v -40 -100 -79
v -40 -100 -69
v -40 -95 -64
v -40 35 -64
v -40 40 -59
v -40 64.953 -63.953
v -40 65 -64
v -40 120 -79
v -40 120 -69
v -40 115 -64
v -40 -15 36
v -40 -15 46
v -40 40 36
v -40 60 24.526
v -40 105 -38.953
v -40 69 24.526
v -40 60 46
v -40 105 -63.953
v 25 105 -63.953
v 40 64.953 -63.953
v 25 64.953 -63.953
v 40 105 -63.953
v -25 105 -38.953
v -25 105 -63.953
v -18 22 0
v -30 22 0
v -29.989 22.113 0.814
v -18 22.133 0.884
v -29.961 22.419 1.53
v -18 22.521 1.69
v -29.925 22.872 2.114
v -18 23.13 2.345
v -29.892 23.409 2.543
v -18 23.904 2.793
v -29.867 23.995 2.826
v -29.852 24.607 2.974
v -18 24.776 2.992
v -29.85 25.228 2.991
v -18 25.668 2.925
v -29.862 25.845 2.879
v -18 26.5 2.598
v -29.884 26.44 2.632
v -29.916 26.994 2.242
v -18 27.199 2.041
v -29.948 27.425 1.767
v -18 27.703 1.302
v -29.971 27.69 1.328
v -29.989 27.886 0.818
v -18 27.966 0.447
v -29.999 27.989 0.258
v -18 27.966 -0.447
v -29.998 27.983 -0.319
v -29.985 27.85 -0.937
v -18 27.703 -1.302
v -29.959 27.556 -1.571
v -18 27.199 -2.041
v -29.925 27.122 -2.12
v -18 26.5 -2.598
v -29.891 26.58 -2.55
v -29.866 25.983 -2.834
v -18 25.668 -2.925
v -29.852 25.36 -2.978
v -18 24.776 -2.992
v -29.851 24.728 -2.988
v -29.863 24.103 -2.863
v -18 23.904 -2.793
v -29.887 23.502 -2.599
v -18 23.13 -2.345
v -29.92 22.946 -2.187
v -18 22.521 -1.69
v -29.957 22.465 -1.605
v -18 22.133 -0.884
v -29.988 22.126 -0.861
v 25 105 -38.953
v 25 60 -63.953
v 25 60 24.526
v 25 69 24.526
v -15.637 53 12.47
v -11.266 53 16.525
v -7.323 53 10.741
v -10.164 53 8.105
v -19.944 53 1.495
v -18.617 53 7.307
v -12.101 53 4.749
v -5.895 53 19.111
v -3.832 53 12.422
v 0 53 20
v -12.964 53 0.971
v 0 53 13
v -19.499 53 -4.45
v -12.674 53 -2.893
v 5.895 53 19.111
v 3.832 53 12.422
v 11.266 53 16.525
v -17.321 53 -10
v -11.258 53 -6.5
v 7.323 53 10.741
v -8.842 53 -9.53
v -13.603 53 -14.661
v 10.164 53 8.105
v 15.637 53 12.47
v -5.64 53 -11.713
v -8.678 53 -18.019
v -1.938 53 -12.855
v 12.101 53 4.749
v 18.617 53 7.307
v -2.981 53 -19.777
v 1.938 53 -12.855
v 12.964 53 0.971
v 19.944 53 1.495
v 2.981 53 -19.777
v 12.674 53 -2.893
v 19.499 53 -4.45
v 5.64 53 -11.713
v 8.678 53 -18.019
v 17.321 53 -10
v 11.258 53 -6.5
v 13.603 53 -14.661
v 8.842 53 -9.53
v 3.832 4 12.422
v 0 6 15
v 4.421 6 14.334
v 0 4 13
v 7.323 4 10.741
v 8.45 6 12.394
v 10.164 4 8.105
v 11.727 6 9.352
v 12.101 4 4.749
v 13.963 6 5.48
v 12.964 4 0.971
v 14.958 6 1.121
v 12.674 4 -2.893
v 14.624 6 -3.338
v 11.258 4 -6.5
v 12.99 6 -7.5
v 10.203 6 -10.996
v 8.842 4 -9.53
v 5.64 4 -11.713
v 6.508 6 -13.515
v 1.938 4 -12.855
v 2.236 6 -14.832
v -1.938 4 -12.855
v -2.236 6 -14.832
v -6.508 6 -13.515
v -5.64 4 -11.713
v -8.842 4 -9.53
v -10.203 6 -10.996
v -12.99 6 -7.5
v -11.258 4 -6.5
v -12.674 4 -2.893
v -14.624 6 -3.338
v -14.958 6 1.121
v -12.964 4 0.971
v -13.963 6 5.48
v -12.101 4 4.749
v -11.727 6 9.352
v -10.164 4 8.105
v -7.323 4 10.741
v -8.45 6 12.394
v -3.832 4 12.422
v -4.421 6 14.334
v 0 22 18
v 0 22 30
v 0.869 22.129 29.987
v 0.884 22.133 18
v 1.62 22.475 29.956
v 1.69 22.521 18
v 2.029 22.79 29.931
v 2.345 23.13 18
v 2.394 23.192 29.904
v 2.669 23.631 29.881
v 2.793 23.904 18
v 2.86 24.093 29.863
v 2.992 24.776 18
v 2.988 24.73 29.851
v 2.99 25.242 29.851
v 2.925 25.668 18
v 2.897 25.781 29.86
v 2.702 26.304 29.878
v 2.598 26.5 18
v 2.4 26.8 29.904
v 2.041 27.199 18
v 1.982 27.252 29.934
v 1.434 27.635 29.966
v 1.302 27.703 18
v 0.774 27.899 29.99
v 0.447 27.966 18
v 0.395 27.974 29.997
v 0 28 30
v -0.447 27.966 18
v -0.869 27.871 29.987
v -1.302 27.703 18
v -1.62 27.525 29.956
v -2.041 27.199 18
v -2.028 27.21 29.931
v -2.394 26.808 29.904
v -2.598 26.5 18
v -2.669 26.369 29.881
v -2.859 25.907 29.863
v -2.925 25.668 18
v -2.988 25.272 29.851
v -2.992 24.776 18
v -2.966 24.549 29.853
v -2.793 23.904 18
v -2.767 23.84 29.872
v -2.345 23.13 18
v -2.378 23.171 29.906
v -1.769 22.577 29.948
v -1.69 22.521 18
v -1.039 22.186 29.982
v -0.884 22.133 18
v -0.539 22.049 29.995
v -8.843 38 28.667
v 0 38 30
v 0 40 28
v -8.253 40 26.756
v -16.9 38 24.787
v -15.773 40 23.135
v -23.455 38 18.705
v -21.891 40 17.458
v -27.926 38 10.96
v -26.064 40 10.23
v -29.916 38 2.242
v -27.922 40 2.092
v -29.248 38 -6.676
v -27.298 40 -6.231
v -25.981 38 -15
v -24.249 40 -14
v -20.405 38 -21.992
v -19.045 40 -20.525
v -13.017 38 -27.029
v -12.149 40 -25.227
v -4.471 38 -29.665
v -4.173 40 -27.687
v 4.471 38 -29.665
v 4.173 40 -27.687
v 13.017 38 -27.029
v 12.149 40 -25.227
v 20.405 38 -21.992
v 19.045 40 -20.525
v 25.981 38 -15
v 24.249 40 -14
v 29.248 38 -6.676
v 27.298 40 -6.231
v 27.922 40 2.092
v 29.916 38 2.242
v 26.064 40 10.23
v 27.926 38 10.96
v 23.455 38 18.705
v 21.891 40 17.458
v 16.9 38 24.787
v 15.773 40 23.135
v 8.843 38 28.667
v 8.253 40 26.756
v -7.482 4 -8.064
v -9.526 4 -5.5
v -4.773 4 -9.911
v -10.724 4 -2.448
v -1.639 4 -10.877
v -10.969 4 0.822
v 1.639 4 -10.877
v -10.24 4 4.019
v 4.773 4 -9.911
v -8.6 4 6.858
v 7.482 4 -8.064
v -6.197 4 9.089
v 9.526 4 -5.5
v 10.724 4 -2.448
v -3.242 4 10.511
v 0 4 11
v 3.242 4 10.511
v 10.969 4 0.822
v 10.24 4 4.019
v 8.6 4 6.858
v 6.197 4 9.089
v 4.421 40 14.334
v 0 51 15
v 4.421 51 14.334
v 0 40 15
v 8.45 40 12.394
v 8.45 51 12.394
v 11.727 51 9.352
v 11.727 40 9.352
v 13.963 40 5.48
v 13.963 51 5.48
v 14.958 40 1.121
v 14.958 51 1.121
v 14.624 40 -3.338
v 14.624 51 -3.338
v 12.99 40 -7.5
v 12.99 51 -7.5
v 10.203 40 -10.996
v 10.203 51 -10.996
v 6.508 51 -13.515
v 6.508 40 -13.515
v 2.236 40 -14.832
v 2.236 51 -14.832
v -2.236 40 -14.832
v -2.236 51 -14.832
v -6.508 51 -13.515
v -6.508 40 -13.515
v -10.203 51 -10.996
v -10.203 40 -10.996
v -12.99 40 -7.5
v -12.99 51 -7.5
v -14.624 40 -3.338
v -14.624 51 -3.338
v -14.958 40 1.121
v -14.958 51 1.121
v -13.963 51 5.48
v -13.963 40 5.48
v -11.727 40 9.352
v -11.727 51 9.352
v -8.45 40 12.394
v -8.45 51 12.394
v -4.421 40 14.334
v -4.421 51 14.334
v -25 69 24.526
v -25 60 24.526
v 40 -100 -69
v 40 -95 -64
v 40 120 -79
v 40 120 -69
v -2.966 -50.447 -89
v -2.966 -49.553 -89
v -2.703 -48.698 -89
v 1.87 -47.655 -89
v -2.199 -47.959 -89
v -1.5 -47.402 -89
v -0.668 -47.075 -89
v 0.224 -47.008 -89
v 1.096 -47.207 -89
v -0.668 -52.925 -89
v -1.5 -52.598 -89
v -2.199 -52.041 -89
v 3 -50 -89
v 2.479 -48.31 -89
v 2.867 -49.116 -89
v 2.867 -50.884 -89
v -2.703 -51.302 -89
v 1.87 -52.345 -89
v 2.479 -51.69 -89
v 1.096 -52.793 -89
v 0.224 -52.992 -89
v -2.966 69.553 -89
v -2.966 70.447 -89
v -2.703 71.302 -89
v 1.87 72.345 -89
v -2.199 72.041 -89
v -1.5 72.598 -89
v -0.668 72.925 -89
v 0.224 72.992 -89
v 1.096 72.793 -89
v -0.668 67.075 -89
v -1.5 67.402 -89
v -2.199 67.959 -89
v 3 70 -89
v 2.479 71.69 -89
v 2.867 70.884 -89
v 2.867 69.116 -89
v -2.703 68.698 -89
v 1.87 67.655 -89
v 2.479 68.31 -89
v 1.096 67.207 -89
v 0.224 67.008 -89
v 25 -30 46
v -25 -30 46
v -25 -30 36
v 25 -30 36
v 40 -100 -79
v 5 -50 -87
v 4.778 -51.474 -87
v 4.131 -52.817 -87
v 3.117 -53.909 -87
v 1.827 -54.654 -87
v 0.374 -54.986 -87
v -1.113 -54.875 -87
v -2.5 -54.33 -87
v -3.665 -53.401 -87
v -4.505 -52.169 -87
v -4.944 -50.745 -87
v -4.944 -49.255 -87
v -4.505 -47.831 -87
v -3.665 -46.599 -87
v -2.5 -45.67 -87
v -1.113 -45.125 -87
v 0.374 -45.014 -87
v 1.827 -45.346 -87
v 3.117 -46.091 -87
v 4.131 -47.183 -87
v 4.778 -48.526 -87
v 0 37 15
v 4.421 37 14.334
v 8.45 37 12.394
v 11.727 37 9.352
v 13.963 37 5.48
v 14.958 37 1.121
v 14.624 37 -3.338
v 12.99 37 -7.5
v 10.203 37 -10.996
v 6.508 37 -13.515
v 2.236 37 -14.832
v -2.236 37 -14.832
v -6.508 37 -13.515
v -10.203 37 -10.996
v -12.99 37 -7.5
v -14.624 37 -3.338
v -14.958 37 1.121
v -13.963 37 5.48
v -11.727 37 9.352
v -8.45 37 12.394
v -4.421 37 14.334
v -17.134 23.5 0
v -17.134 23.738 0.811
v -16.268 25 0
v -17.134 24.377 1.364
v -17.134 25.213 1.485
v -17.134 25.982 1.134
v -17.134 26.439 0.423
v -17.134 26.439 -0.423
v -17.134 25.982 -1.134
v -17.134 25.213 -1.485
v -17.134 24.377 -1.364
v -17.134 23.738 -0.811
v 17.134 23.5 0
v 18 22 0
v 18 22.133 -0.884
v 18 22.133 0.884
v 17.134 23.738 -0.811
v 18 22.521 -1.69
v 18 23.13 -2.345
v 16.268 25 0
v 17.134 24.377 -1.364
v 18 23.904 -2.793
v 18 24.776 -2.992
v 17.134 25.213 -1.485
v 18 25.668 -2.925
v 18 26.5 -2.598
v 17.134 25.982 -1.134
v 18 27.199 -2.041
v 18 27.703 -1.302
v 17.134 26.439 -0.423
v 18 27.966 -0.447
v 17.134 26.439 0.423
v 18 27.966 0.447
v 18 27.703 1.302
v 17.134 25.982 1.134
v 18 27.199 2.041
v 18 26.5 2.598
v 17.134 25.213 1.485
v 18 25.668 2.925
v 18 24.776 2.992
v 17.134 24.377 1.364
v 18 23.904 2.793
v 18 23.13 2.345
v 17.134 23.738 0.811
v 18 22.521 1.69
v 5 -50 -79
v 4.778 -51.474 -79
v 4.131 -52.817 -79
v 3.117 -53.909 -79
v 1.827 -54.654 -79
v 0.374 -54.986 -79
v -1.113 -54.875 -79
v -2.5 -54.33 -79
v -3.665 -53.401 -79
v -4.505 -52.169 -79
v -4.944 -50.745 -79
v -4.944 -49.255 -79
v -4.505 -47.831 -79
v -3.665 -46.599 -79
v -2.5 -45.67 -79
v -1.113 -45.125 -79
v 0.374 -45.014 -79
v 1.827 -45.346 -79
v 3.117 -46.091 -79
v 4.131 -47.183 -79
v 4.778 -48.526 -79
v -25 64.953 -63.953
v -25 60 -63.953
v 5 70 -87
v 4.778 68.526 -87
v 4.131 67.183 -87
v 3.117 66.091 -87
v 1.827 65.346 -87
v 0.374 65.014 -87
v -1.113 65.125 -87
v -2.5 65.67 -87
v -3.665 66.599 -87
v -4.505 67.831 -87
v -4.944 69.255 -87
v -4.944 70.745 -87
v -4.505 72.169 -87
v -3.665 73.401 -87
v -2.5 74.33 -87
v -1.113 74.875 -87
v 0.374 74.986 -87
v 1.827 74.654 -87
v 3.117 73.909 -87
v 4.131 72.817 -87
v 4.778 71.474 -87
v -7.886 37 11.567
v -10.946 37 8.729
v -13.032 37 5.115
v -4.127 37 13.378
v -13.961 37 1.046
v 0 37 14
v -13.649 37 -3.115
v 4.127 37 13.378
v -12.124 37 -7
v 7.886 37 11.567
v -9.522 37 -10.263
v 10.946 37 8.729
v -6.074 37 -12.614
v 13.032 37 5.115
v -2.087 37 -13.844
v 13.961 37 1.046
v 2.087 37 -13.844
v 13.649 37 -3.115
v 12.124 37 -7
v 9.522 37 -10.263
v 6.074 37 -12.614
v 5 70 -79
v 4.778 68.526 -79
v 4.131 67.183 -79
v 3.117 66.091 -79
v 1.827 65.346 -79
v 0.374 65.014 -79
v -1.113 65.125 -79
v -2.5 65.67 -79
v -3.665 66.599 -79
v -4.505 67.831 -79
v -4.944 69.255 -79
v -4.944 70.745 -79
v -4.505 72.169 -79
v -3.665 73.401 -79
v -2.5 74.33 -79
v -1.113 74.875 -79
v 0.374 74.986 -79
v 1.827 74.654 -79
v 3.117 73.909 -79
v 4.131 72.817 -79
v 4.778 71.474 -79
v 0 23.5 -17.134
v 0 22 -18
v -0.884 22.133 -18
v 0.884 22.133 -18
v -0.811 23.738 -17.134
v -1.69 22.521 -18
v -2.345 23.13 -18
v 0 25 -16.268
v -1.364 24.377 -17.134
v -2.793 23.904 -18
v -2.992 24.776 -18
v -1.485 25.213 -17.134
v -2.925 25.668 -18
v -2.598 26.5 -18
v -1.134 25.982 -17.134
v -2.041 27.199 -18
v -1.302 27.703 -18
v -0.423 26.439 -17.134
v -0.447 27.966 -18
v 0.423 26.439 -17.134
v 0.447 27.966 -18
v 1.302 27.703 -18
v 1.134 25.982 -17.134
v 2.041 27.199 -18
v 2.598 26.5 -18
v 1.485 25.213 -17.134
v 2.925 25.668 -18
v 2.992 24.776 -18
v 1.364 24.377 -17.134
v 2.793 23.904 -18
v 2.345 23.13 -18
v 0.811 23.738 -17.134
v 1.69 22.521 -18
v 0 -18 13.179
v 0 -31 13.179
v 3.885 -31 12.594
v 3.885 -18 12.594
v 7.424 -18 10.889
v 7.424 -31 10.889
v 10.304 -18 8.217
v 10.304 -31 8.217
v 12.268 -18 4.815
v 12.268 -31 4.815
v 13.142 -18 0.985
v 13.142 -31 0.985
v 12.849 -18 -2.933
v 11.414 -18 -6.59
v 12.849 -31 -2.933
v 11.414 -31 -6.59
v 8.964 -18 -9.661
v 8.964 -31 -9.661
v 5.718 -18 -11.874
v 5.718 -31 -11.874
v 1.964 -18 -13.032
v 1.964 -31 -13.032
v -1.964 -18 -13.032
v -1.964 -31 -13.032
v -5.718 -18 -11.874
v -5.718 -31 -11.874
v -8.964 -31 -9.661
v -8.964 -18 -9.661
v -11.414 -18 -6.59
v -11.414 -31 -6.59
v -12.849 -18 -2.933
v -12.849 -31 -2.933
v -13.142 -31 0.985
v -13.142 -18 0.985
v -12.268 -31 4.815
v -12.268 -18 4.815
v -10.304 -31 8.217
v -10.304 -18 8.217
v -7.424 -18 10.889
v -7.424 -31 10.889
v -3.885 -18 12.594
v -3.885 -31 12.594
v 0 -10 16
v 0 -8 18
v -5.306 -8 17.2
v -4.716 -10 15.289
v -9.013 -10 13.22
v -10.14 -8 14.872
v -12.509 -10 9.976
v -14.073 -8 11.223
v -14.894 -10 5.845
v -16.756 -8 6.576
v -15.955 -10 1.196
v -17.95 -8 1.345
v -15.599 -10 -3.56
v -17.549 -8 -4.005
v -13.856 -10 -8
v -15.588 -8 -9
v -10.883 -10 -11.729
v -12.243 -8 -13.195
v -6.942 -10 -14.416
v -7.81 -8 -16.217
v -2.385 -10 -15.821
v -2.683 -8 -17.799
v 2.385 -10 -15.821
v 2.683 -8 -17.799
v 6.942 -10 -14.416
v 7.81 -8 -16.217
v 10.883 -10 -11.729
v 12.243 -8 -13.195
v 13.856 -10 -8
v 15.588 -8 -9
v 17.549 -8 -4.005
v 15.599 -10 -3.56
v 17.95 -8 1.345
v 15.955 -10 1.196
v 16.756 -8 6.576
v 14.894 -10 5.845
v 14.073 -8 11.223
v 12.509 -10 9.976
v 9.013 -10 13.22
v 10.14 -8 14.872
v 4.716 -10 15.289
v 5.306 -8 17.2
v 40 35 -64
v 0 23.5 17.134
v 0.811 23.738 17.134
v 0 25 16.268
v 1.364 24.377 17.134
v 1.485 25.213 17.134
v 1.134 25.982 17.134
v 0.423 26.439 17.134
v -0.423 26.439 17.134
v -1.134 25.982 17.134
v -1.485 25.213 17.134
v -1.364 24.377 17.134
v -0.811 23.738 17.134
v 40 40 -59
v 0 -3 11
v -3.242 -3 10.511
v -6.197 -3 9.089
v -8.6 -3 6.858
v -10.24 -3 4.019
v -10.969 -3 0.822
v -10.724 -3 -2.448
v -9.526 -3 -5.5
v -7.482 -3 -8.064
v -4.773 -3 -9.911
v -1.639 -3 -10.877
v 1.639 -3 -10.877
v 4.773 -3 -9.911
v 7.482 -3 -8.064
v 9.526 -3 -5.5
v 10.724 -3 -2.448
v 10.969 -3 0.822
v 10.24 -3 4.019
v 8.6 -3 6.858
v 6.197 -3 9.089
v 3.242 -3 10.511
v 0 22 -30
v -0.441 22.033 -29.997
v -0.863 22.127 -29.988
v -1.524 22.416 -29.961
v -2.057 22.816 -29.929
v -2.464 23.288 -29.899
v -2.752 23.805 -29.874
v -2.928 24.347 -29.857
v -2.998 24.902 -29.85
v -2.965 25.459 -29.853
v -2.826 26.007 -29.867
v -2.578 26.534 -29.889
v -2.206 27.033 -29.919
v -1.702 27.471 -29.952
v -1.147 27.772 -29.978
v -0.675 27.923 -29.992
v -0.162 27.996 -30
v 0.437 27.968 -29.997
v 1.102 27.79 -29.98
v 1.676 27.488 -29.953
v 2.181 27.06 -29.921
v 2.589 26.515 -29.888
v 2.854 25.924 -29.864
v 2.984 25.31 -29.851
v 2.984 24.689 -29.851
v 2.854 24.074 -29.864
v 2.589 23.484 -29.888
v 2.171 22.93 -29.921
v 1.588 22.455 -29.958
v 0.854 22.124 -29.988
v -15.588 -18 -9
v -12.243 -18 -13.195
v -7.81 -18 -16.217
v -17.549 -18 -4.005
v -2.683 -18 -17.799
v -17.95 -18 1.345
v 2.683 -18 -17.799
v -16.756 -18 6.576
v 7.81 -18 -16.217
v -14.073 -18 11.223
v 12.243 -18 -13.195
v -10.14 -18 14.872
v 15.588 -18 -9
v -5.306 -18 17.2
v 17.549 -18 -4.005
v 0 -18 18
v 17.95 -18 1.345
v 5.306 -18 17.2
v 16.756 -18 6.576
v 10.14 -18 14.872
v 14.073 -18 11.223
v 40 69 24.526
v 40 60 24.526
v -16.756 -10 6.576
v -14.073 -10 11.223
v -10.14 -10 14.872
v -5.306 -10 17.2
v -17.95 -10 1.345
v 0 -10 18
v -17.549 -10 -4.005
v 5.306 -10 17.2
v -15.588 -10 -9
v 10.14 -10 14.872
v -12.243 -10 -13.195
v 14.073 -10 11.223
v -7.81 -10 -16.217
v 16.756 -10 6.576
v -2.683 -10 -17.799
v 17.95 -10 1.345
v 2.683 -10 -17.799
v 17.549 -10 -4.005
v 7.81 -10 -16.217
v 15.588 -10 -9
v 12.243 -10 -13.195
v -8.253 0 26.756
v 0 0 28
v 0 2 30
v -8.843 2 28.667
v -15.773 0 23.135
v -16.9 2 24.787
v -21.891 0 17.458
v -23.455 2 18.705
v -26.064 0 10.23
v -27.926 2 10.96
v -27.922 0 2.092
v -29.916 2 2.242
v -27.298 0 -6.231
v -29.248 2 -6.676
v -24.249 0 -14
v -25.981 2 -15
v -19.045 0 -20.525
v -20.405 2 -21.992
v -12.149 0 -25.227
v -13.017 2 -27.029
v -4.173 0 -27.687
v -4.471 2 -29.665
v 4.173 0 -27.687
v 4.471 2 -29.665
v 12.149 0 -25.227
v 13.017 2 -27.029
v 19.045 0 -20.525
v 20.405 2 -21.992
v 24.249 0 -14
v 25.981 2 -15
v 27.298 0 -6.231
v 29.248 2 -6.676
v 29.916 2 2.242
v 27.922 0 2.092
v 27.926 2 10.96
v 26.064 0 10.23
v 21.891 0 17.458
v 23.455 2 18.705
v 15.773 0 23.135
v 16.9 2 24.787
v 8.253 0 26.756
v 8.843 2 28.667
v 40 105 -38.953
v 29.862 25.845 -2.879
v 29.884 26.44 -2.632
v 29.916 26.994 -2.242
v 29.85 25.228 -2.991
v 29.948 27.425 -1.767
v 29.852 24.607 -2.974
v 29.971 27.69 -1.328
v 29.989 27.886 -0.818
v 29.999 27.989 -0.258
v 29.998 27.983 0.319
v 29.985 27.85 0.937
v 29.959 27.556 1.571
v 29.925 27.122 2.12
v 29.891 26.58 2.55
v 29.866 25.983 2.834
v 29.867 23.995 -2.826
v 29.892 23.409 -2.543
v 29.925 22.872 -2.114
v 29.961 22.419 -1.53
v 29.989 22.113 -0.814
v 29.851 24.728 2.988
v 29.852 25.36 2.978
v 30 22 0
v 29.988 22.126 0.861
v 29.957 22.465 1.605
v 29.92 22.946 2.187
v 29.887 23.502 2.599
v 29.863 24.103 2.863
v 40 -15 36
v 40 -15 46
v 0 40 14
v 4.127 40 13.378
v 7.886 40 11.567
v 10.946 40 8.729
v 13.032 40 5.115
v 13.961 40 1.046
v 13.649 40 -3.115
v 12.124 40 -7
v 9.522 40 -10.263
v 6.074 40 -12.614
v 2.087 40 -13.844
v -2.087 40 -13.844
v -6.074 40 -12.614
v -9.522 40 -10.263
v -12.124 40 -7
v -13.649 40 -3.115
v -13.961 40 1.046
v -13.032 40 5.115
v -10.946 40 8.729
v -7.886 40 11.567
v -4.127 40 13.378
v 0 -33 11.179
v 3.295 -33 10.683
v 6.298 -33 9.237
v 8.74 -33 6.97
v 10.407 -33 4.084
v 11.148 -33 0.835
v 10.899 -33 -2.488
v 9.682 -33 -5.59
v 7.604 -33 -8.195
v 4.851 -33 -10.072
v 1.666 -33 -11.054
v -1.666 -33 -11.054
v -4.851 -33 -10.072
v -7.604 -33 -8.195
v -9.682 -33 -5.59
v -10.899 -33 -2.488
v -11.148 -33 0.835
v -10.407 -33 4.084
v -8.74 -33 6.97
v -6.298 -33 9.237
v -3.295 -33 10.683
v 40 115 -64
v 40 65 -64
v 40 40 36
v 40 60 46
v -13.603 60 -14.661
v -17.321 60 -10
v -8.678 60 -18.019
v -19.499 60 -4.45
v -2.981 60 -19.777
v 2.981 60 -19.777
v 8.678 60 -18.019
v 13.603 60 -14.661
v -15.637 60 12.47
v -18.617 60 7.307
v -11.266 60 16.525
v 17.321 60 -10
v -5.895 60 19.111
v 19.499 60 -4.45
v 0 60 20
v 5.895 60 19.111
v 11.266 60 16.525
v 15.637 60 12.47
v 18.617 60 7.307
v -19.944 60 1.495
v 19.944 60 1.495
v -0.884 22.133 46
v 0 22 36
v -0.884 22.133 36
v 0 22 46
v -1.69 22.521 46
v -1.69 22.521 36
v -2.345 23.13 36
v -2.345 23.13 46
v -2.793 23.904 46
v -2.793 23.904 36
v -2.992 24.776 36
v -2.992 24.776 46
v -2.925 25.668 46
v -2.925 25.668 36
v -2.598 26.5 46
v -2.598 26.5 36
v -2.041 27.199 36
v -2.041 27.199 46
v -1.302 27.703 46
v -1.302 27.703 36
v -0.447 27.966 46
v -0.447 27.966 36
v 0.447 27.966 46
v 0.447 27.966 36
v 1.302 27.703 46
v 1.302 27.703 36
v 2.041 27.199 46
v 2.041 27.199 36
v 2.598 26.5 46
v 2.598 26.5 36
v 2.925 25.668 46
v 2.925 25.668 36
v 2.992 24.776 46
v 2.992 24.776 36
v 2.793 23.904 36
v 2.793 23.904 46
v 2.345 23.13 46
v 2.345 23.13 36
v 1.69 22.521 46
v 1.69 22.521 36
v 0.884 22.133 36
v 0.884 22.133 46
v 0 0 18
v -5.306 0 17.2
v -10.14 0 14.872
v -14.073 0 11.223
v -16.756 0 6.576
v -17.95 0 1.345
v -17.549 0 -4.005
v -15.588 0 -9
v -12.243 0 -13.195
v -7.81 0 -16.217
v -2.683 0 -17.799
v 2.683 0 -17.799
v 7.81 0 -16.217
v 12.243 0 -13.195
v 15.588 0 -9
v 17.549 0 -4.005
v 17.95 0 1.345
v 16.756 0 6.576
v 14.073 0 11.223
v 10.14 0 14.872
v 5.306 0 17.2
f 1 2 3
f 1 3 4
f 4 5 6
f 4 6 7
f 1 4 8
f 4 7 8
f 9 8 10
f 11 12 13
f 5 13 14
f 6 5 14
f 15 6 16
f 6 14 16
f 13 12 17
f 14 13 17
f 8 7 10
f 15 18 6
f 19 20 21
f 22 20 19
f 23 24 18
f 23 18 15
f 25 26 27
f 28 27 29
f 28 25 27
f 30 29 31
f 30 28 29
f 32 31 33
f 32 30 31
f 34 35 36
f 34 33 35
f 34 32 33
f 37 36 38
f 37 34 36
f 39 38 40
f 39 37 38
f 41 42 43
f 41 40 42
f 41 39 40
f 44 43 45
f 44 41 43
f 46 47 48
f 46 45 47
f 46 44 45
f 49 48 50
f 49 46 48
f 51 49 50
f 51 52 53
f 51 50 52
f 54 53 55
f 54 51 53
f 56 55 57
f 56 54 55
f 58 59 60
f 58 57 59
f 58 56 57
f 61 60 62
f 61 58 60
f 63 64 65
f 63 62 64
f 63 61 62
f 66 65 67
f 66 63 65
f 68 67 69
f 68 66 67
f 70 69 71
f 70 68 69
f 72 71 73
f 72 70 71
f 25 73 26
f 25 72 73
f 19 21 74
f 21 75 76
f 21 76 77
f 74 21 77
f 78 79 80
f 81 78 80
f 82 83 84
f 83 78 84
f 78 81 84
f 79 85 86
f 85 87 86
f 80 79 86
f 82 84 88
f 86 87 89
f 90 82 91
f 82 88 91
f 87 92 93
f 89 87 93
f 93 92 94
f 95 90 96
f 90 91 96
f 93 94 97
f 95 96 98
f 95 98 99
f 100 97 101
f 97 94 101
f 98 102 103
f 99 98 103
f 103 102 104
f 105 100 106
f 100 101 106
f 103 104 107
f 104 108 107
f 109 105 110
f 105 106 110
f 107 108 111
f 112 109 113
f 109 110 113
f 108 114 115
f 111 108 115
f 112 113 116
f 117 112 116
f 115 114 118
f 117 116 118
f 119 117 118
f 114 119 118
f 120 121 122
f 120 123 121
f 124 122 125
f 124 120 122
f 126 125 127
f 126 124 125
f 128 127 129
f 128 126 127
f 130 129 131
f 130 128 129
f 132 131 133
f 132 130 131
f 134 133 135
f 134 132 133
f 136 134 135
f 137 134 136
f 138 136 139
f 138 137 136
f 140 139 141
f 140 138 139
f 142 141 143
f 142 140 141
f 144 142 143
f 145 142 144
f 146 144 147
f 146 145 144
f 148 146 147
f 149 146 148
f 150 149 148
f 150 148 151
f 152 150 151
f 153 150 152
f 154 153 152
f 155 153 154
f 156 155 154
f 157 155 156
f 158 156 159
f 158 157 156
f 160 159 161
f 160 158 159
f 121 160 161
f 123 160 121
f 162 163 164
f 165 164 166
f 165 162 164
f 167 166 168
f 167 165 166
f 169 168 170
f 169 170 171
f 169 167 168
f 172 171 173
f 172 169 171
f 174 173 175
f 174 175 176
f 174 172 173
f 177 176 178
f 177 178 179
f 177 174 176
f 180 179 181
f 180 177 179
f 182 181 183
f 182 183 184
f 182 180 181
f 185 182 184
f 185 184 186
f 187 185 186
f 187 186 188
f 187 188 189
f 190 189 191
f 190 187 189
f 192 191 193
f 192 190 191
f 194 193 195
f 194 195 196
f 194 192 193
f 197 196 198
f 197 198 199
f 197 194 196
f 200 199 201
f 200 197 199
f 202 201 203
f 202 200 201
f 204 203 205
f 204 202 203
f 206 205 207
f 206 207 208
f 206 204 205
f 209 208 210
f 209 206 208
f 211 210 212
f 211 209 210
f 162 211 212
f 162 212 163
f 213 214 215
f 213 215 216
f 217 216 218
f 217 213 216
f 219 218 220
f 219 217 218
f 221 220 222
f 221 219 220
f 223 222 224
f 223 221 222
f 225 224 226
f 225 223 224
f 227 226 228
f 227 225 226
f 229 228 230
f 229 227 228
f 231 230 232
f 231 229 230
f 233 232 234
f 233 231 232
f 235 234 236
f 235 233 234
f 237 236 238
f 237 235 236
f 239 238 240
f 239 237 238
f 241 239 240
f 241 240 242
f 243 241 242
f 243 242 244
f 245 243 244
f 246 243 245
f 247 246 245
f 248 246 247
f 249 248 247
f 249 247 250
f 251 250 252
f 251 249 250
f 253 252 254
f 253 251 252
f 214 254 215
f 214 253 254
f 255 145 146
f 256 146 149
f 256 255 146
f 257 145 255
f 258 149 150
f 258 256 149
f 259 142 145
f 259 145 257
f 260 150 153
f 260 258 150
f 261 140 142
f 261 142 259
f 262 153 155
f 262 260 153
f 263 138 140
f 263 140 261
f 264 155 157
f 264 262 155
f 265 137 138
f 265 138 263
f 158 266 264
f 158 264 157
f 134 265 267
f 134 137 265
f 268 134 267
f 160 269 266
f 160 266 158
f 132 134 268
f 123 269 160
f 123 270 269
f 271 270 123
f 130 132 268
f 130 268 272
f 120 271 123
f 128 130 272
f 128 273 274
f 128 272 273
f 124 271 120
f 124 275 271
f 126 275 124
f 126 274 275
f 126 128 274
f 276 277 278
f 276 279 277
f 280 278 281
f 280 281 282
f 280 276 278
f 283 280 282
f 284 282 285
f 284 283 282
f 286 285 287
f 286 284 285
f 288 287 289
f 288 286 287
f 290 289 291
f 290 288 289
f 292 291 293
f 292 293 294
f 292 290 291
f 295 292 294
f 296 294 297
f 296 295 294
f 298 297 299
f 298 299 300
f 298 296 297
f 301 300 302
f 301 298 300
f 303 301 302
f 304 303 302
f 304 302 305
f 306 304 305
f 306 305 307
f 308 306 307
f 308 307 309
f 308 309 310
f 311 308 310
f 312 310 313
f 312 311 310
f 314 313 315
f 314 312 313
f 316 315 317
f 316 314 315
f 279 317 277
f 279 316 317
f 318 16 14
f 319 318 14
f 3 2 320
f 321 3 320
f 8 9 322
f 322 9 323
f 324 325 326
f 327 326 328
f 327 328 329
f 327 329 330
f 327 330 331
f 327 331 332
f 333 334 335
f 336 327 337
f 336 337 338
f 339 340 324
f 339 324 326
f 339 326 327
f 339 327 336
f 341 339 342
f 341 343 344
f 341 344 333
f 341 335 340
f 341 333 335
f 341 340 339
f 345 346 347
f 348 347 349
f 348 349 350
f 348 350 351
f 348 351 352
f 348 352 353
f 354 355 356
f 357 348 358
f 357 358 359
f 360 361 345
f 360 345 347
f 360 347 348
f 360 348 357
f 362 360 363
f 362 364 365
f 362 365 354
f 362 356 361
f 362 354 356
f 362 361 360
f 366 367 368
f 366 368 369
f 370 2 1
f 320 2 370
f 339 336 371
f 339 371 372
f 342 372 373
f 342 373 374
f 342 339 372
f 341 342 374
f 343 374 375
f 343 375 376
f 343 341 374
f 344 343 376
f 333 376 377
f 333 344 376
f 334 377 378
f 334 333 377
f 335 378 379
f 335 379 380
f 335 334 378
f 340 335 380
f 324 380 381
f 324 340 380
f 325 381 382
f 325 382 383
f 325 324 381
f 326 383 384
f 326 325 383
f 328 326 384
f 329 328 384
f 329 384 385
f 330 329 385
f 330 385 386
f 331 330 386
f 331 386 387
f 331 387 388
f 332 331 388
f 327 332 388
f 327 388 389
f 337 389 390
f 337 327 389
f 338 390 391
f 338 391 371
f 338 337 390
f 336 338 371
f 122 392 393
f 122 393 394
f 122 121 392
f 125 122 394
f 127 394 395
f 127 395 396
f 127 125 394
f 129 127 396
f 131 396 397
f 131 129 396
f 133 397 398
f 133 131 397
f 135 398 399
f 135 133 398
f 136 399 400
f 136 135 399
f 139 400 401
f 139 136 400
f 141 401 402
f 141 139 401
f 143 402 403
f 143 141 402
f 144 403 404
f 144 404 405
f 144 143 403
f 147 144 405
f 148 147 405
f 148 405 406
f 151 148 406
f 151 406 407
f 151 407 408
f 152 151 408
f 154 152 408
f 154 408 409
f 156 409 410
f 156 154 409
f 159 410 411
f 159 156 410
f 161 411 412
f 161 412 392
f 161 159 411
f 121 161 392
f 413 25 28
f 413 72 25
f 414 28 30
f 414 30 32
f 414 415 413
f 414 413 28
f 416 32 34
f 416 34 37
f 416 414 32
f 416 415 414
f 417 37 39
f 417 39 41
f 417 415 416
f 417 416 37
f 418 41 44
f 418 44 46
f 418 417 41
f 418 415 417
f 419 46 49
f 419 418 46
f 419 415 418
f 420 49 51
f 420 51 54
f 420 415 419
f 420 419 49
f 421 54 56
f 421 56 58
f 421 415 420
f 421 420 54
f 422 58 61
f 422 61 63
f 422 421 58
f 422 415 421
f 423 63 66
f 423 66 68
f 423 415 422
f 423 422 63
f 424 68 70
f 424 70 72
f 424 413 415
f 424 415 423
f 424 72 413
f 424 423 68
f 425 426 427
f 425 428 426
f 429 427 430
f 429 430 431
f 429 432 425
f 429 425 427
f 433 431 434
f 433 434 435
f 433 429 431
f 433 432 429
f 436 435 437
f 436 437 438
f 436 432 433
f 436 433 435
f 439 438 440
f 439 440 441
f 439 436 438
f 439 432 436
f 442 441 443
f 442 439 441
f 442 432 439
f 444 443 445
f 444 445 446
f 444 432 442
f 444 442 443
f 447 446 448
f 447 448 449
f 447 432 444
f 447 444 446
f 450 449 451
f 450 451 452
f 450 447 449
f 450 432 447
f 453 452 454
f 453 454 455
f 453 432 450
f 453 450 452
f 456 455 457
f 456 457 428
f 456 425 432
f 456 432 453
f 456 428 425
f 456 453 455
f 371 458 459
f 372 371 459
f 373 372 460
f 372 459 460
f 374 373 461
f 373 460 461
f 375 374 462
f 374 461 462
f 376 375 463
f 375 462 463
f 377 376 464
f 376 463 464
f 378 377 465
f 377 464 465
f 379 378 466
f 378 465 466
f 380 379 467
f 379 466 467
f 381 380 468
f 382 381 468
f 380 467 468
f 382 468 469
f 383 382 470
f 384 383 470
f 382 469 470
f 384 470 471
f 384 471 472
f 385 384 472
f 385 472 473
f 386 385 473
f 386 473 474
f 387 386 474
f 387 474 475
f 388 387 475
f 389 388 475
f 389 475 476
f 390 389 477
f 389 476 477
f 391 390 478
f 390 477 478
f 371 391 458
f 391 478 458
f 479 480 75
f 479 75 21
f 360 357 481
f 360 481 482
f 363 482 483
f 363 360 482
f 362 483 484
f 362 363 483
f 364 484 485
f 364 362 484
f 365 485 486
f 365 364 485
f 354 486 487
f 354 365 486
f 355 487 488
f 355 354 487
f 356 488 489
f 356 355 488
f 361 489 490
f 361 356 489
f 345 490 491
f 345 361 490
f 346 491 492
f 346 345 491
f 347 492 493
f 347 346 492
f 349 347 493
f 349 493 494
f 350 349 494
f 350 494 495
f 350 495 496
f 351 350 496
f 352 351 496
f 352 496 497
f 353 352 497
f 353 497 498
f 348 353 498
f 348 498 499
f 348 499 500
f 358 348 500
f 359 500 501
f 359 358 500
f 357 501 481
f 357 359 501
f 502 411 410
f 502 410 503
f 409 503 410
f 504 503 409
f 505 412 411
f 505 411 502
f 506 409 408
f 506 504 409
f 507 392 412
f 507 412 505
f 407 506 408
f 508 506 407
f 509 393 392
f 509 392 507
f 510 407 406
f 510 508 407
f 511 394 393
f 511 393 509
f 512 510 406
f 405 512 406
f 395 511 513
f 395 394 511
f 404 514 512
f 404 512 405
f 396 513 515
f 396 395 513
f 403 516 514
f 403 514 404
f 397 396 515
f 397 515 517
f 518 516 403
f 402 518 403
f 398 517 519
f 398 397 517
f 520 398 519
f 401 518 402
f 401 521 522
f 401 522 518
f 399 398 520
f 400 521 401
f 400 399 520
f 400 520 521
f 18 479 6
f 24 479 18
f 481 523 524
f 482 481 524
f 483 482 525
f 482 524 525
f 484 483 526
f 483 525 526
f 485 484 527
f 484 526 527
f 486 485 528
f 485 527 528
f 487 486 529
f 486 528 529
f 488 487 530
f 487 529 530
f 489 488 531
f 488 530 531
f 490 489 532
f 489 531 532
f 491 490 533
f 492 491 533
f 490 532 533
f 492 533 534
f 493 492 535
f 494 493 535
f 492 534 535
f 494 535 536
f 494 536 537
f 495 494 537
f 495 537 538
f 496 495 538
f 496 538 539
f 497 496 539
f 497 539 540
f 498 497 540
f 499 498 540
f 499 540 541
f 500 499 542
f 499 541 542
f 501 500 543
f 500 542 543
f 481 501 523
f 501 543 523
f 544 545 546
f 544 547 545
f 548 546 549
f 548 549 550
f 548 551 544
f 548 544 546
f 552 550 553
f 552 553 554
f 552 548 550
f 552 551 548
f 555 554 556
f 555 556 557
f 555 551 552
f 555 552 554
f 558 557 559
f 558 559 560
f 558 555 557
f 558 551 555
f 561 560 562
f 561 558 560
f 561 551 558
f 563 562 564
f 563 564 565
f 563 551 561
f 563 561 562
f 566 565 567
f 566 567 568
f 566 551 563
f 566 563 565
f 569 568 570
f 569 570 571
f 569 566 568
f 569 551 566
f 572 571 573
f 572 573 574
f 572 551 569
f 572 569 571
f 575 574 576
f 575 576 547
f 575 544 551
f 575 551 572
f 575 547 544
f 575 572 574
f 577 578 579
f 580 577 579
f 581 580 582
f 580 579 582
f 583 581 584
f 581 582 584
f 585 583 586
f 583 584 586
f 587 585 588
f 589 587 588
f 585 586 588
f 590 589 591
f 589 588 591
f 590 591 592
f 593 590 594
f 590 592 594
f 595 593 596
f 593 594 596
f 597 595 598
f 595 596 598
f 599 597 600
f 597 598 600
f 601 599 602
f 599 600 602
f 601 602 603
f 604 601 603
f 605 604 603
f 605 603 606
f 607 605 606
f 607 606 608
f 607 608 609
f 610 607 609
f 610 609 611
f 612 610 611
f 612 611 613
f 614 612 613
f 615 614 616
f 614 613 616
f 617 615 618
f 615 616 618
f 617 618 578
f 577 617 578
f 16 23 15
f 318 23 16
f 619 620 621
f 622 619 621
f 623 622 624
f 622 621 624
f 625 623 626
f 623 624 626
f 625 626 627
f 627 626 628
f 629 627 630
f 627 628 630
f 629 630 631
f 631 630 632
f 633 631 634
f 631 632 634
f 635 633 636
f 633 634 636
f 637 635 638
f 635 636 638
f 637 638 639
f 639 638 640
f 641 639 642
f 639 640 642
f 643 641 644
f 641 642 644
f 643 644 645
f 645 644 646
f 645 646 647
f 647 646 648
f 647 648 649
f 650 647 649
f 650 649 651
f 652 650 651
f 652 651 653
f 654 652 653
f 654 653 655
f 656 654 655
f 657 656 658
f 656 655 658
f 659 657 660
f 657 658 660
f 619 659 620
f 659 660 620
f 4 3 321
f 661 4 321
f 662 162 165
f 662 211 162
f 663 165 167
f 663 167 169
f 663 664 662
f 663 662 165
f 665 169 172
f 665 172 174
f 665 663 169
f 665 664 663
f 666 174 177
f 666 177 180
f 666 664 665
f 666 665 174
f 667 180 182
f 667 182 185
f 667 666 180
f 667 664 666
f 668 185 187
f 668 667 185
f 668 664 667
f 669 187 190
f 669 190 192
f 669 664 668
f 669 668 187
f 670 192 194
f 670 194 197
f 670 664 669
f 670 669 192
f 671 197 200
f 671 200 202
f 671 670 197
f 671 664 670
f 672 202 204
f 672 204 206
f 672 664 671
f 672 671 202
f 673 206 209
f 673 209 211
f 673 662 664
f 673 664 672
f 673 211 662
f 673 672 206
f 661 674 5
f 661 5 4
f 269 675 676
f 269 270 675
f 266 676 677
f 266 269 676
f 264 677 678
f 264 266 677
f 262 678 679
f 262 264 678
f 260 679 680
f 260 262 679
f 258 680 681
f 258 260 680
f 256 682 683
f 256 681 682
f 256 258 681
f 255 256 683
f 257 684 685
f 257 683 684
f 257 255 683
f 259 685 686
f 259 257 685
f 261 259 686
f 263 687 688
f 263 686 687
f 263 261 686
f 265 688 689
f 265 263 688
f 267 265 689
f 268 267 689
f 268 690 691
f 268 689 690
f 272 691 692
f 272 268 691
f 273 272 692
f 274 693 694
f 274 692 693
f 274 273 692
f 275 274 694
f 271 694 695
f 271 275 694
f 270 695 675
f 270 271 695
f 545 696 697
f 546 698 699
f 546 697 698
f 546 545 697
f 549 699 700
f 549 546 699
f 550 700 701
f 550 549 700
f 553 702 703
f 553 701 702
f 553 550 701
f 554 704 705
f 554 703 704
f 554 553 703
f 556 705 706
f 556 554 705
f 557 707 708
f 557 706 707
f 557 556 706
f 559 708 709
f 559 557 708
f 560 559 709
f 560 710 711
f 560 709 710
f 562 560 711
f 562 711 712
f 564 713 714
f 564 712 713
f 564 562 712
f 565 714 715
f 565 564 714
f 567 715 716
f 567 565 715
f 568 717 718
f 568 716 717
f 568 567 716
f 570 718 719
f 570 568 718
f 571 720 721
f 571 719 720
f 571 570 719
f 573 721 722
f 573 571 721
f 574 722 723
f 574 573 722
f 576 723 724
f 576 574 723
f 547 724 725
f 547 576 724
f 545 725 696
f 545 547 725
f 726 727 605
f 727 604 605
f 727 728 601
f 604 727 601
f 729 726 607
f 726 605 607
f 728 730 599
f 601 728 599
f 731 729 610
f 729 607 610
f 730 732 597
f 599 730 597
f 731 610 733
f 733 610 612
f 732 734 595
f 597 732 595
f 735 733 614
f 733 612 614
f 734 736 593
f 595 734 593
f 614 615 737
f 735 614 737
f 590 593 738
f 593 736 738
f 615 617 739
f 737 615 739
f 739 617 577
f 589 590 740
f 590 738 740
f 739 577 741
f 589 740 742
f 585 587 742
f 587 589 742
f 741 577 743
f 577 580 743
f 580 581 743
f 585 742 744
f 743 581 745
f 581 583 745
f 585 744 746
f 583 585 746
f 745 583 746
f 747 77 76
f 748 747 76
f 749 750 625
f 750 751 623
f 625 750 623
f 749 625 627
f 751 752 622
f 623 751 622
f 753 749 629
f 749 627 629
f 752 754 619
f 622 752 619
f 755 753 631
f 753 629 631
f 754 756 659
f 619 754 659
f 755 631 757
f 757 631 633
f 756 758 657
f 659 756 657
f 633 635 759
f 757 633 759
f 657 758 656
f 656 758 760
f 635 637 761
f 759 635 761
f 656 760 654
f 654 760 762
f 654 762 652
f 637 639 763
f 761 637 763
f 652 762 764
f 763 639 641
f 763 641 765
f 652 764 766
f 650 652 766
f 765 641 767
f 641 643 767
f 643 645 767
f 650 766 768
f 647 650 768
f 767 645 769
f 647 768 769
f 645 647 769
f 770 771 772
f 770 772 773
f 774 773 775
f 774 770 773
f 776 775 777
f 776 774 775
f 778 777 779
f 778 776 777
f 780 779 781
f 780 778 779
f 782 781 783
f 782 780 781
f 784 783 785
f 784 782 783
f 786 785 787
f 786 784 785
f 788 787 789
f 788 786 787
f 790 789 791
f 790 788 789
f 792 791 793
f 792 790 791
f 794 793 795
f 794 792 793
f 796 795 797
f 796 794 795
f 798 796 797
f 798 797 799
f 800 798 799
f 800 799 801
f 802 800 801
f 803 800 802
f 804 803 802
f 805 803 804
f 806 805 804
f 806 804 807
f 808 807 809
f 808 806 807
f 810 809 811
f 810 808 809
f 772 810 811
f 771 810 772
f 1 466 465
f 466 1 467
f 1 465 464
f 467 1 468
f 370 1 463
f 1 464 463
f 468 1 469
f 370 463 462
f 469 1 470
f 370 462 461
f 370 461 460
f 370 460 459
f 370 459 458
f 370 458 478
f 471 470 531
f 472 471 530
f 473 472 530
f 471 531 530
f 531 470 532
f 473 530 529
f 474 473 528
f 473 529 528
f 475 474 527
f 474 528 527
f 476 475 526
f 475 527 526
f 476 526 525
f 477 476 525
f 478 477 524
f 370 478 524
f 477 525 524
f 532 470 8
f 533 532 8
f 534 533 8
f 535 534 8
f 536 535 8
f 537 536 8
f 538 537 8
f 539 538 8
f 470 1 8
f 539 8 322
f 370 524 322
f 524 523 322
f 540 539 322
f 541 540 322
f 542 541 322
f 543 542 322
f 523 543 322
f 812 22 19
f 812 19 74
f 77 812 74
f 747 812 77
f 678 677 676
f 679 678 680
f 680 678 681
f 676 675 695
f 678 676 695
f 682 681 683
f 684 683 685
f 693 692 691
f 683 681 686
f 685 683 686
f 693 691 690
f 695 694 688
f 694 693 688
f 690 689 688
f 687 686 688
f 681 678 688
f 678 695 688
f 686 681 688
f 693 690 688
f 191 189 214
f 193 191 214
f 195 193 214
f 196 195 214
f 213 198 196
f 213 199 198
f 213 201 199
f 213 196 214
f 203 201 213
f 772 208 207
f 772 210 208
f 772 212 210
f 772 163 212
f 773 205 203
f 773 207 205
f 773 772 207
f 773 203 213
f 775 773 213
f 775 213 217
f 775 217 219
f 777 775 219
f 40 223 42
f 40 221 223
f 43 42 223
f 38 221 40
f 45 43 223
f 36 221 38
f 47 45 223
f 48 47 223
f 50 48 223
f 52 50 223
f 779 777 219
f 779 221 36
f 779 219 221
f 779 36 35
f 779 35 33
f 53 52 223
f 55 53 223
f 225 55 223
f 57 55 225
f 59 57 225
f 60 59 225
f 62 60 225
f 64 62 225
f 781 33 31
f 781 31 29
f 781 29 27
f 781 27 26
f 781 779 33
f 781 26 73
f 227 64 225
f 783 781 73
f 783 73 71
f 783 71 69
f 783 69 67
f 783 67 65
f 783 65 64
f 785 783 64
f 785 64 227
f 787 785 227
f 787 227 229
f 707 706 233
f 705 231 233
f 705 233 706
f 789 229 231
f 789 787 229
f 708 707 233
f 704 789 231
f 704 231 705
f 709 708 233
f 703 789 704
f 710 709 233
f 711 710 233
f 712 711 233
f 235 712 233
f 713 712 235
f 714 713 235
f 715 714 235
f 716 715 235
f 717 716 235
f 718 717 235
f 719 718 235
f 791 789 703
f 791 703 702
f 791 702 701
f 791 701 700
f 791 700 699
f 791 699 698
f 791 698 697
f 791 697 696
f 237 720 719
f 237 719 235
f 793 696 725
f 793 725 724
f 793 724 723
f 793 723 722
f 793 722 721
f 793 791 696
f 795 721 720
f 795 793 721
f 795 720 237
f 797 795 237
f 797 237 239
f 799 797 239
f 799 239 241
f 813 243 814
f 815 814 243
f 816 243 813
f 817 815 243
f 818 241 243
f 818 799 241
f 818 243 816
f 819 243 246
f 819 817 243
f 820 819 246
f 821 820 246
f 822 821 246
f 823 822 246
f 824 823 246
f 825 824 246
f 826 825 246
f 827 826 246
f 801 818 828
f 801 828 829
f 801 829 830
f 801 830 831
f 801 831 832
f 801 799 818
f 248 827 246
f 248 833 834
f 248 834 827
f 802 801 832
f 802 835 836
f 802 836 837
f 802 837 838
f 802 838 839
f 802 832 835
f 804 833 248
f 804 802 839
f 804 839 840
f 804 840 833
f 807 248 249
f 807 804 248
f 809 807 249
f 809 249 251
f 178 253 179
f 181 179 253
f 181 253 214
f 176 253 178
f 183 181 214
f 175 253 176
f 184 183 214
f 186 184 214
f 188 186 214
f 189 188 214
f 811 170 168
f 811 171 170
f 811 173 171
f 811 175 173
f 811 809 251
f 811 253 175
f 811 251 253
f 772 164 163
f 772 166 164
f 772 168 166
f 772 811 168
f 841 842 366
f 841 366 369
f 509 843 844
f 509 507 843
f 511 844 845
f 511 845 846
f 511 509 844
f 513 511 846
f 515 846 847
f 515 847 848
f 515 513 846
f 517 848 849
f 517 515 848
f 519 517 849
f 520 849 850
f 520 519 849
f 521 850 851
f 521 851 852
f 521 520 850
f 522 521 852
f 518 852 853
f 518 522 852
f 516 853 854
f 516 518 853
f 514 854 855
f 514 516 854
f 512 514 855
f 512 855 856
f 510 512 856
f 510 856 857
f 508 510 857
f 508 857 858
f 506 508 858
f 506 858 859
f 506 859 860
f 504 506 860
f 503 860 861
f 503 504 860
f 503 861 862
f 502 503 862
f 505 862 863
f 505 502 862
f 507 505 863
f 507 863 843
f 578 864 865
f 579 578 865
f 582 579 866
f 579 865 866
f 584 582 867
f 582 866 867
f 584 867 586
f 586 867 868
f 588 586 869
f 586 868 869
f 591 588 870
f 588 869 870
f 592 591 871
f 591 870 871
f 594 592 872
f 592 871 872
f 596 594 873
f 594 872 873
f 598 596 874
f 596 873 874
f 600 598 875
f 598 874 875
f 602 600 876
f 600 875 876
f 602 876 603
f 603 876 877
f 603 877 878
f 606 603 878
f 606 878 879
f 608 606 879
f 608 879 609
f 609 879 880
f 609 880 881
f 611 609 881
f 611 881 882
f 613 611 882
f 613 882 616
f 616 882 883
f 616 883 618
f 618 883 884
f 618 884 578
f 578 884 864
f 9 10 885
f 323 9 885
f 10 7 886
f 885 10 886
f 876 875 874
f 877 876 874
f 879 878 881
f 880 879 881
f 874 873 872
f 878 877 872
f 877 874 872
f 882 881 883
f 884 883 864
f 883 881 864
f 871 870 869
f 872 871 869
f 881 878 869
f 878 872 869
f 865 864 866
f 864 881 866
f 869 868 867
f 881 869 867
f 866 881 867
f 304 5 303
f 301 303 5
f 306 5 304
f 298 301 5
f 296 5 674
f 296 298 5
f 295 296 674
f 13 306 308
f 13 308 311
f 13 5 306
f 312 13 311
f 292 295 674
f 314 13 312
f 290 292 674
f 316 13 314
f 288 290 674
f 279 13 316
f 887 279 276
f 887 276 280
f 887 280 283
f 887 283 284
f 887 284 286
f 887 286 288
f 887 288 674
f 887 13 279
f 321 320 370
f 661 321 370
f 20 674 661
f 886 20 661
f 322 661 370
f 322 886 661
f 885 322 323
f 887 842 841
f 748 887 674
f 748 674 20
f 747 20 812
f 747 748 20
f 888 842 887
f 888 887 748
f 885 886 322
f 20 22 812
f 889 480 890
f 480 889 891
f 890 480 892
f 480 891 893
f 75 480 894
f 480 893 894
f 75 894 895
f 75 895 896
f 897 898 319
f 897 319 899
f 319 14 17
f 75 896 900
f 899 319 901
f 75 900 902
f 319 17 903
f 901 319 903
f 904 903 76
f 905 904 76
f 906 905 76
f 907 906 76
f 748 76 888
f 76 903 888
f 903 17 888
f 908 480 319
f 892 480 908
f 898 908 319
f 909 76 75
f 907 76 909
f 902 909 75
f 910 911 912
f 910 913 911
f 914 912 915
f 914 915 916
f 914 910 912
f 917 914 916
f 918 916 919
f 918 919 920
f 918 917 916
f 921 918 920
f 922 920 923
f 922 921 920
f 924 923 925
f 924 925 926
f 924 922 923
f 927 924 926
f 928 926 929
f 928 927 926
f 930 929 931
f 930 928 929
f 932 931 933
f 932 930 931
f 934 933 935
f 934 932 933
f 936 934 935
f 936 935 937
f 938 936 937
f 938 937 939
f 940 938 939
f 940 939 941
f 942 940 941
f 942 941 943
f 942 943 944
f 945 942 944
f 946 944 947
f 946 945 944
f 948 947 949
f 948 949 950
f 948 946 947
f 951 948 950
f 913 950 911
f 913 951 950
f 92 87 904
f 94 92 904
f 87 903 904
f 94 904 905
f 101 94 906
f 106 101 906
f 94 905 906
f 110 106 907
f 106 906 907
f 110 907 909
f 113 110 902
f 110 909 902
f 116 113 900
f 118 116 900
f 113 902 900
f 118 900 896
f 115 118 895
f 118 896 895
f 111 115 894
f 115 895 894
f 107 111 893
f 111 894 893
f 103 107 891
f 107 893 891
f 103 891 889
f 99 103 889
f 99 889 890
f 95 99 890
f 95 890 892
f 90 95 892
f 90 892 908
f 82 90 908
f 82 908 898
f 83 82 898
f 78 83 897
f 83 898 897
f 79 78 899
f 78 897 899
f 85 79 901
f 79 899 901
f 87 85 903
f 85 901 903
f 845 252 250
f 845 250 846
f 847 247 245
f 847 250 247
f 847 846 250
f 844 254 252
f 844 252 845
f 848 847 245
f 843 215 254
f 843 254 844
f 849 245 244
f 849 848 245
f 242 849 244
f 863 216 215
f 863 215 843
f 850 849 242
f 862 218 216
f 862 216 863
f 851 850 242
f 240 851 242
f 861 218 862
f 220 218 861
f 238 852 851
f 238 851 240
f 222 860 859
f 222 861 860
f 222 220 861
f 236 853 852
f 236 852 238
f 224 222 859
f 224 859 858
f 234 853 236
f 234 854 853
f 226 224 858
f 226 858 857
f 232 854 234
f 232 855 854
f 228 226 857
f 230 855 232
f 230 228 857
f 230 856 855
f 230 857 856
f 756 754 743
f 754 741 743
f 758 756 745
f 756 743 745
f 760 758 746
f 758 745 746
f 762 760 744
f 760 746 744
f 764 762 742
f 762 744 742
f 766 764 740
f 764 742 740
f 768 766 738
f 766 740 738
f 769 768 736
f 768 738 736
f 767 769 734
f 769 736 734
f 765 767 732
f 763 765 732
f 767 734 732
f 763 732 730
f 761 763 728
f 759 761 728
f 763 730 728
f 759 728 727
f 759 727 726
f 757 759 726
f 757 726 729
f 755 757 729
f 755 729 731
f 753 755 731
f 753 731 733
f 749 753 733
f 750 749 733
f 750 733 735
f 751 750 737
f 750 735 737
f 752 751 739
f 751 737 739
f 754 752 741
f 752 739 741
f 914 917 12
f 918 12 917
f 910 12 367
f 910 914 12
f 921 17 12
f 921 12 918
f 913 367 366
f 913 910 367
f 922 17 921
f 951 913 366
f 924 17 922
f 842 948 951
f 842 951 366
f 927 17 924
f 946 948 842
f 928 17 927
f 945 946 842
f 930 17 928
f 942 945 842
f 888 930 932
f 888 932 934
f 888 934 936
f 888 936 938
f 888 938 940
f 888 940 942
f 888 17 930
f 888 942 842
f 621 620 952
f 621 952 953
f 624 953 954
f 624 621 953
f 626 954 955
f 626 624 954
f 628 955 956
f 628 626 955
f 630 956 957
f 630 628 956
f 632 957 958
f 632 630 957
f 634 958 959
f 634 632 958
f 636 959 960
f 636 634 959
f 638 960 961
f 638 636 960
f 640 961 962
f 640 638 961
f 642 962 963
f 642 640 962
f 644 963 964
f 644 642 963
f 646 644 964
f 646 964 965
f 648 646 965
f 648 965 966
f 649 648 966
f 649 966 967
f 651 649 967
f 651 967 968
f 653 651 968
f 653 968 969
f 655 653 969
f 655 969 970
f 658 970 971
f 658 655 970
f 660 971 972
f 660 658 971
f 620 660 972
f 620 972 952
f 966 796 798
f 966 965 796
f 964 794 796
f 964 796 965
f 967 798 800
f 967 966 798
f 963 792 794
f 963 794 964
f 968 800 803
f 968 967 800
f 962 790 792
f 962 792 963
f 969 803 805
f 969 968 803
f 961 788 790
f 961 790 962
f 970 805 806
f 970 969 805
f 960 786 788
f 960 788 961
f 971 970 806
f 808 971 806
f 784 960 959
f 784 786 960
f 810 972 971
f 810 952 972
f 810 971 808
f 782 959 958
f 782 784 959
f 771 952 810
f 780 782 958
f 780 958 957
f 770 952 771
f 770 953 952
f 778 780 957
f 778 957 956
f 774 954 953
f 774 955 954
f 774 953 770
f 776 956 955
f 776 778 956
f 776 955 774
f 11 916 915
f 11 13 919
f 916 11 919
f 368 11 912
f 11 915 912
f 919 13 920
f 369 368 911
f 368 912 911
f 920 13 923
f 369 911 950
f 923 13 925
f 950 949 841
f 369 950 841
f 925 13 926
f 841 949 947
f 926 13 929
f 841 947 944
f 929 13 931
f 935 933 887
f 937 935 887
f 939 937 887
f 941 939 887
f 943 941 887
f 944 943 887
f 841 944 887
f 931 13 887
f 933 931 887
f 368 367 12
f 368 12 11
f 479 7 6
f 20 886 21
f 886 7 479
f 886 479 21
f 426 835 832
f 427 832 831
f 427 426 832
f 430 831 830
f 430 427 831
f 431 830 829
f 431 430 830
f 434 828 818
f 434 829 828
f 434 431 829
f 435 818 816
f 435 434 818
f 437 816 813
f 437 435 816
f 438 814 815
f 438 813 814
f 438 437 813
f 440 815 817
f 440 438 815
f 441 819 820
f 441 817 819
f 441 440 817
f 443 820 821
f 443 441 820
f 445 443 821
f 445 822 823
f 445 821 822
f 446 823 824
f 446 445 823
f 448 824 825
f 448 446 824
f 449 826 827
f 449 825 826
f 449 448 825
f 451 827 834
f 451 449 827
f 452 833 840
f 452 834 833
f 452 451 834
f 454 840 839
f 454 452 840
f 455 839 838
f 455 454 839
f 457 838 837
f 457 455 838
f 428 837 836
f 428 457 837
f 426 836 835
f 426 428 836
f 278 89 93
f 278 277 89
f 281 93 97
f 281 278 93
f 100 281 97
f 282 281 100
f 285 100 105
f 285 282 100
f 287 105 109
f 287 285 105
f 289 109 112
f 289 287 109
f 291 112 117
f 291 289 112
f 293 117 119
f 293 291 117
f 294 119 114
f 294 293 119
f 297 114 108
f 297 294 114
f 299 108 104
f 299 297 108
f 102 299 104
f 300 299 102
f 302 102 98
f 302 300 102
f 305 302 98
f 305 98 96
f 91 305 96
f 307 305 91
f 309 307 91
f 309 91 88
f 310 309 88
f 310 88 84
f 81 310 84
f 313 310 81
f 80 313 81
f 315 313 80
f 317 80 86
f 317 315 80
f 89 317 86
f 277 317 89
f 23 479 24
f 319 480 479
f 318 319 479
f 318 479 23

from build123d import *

# Parameters (mm, degrees)
F2_SIZE         = 2
F4_COPIES_COUNT = 4
F6_W            = 2
F6_H            = 10
F8_W            = 80
F8_H            = 90
F8_R            = 5
F9_DEPTH        = 10
F10_SIZE        = 15
F12_W           = 80
F12_H           = 100
F13_DEPTH       = 20
F15_DEPTH       = 80
F17_W           = 80
F17_H           = 15
F18_DEPTH       = 120
F18_DEPTH_BACK  = 100
F19_SIZE        = 5
F20_R           = 5
F21_DEPTH       = 10
F22_SIZE        = 2
F23_DEPTH       = 40
F23_DEPTH_BACK  = 40
F24_DEPTH       = 25
F24_DEPTH_BACK  = 25
F25_W           = 7
F25_H           = 20
F31_SIZE        = 2


# Not quite as in the source:
# - a pattern or mirror of a feature is missing from the dataset's text; its kind, count and spacing are read off the source's solid


with BuildPart() as f1:
    # F0 (on Right) → F1 (revolve)
    with BuildSketch(Plane.YZ):
        Polygon((-10, 18), (-10, 11), (40, 11), (40, 30), (0, 30), (0, 18), align=None)
    revolve(axis=Axis((0, 15, 0), (0, -1, 0)))

    # F2
    f2_edges = [f1.edges().sort_by_distance(p)[0] for p in [
        (0, -10, -18),
        (0, 0, -30),
        (0, 40, -30),
    ]]
    chamfer(f2_edges, length=F2_SIZE)

    # F3 (on Right) → F4 (revolve, cut)
    with BuildSketch(Plane.YZ):
        Polygon((22, 18), (25, 16.2679491924), (25, 30), (22, 30), align=None)
    f4 = revolve(axis=Axis((0, 25, 23.1339745962), (0, 0, 1)), mode=Mode.SUBTRACT)

    # F4_copies: F4 ×4 about axis
    f4_copies_axis = Axis((0, 0, 0), (0, 1, 0))
    for i in range(1, F4_COPIES_COUNT):
        add(f4.rotate(f4_copies_axis, i * 360 / F4_COPIES_COUNT), mode=Mode.SUBTRACT)


with BuildPart() as f7:
    # F6 (on Right) → F7 (revolve)
    with BuildSketch(Plane.YZ):
        with Locations((21, 41)):
            Rectangle(F6_W, F6_H)
    revolve(axis=Axis((0, 25, 40.9752885997), (0, 0, -1)))

    # F8 (on offset) → F9 (join)
    with BuildSketch(Plane.XY.offset(46)):
        with Locations((0, 15)):
            Rectangle(F8_W, F8_H)
        with Locations((0, 25)):
            Circle(F8_R, mode=Mode.SUBTRACT)
    extrude(amount=-F9_DEPTH)

    # F10
    f10_edges = [f7.edges().sort_by_distance(p)[0] for p in [
        (-40, -30, 41),
        (40, -30, 41),
    ]]
    chamfer(f10_edges, length=F10_SIZE)

    # F12 (on offset) → F13 (join)
    with BuildSketch(Plane.XZ.offset(-60)):
        with Locations((0, -14)):
            Rectangle(F12_W, F12_H)
    extrude(amount=F13_DEPTH)

    # F14 (on face) → F15 (join)
    with BuildSketch(Plane.YZ.offset(40)):
        Polygon((35, -64), (40, -64), (40, -59), align=None)
        Polygon((60, -59), (60, -64), (65, -64), align=None)
    extrude(amount=-F15_DEPTH)

    # F17 (on Front) → F18 (join, two sides)
    with BuildSketch(Plane.XZ) as f18_sk:
        with Locations((0, -71.5)):
            Rectangle(F17_W, F17_H)
    extrude(amount=-F18_DEPTH)
    extrude(f18_sk.sketch, amount=F18_DEPTH_BACK)

    # F19
    f19_edges = [f7.edges().sort_by_distance(p)[0] for p in [
        (0, 120, -64),
        (0, -100, -64),
    ]]
    chamfer(f19_edges, length=F19_SIZE)

    # F20 (on face) → F21 (join)
    with BuildSketch(Plane(origin=(0, 0, -79), x_dir=(1, 0, 0), z_dir=(0, 0, -1))):
        with Locations((0, 50)):
            Circle(F20_R)
        with Locations((0, -70)):
            Circle(F20_R)
    extrude(amount=F21_DEPTH)

    # F22
    f22_edges = [f7.edges().sort_by_distance(p)[0] for p in [
        (-5, -50, -89),
        (-5, 70, -89),
    ]]
    chamfer(f22_edges, length=F22_SIZE)

    # F16 (on Right) → F23 (join, two sides)
    with BuildSketch(Plane.YZ) as f23_sk:
        Polygon((69, 24.5257518999), (60, 24.5257518999), (60, -63.9528611181), (105, -63.9528611181), (105, -38.9528611181), align=None)
    extrude(amount=F23_DEPTH)
    extrude(f23_sk.sketch, amount=-F23_DEPTH_BACK)

    # F16 (on Right) → F24 (cut, two sides)
    with BuildSketch(Plane.YZ) as f24_sk:
        Polygon((69, 24.5257518999), (60, 24.5257518999), (60, -63.9528611181), (105, -63.9528611181), (105, -38.9528611181), align=None)
    extrude(amount=F24_DEPTH, mode=Mode.SUBTRACT)
    extrude(f24_sk.sketch, amount=-F24_DEPTH_BACK, mode=Mode.SUBTRACT)

    # F25 (on Right) → F26 (revolve, cut)
    with BuildSketch(Plane.YZ):
        with Locations((56.5, 10)):
            Rectangle(F25_W, F25_H)
    revolve(axis=Axis((0, 56.5, 0), (0, 1, 0)), mode=Mode.SUBTRACT)


with BuildPart() as f28_tool:
    # F27 (on Right) → F28 (revolve)
    with BuildSketch(Plane.YZ):
        Polygon((53, 13), (51, 15), (40, 15), (40, 14), (37, 14), (37, 15), (6, 15), (4, 13), (4, 0), (53, 0), align=None)
    revolve(axis=Axis((0, 28.5, 0), (0, 1, 0)))


with BuildPart() as f1_1:
    add(f1.part)

    # F28: cut by f28_tool
    add(f28_tool.part, mode=Mode.SUBTRACT)

    # F29 (on Right) → F30 (revolve)
    with BuildSketch(Plane.YZ):
        Polygon((-18, 18), (-18, 13.1793413311), (-33, 13.1793413311), (-33, 0), (-3, 0), (-3, 11), (-10, 11), (-10, 18), align=None)
    revolve(axis=Axis((0, -18, 0), (0, 1, 0)))

    # F31
    f31_edges = [f1_1.edges().sort_by_distance(p)[0] for p in [
        (0, -33, -13.179341),
    ]]
    chamfer(f31_edges, length=F31_SIZE)


with BuildPart() as f7_1:
    add(f7.part)

    # F28: cut by f28_tool
    add(f28_tool.part, mode=Mode.SUBTRACT)


solid = Compound([f1_1.part, f7_1.part])
